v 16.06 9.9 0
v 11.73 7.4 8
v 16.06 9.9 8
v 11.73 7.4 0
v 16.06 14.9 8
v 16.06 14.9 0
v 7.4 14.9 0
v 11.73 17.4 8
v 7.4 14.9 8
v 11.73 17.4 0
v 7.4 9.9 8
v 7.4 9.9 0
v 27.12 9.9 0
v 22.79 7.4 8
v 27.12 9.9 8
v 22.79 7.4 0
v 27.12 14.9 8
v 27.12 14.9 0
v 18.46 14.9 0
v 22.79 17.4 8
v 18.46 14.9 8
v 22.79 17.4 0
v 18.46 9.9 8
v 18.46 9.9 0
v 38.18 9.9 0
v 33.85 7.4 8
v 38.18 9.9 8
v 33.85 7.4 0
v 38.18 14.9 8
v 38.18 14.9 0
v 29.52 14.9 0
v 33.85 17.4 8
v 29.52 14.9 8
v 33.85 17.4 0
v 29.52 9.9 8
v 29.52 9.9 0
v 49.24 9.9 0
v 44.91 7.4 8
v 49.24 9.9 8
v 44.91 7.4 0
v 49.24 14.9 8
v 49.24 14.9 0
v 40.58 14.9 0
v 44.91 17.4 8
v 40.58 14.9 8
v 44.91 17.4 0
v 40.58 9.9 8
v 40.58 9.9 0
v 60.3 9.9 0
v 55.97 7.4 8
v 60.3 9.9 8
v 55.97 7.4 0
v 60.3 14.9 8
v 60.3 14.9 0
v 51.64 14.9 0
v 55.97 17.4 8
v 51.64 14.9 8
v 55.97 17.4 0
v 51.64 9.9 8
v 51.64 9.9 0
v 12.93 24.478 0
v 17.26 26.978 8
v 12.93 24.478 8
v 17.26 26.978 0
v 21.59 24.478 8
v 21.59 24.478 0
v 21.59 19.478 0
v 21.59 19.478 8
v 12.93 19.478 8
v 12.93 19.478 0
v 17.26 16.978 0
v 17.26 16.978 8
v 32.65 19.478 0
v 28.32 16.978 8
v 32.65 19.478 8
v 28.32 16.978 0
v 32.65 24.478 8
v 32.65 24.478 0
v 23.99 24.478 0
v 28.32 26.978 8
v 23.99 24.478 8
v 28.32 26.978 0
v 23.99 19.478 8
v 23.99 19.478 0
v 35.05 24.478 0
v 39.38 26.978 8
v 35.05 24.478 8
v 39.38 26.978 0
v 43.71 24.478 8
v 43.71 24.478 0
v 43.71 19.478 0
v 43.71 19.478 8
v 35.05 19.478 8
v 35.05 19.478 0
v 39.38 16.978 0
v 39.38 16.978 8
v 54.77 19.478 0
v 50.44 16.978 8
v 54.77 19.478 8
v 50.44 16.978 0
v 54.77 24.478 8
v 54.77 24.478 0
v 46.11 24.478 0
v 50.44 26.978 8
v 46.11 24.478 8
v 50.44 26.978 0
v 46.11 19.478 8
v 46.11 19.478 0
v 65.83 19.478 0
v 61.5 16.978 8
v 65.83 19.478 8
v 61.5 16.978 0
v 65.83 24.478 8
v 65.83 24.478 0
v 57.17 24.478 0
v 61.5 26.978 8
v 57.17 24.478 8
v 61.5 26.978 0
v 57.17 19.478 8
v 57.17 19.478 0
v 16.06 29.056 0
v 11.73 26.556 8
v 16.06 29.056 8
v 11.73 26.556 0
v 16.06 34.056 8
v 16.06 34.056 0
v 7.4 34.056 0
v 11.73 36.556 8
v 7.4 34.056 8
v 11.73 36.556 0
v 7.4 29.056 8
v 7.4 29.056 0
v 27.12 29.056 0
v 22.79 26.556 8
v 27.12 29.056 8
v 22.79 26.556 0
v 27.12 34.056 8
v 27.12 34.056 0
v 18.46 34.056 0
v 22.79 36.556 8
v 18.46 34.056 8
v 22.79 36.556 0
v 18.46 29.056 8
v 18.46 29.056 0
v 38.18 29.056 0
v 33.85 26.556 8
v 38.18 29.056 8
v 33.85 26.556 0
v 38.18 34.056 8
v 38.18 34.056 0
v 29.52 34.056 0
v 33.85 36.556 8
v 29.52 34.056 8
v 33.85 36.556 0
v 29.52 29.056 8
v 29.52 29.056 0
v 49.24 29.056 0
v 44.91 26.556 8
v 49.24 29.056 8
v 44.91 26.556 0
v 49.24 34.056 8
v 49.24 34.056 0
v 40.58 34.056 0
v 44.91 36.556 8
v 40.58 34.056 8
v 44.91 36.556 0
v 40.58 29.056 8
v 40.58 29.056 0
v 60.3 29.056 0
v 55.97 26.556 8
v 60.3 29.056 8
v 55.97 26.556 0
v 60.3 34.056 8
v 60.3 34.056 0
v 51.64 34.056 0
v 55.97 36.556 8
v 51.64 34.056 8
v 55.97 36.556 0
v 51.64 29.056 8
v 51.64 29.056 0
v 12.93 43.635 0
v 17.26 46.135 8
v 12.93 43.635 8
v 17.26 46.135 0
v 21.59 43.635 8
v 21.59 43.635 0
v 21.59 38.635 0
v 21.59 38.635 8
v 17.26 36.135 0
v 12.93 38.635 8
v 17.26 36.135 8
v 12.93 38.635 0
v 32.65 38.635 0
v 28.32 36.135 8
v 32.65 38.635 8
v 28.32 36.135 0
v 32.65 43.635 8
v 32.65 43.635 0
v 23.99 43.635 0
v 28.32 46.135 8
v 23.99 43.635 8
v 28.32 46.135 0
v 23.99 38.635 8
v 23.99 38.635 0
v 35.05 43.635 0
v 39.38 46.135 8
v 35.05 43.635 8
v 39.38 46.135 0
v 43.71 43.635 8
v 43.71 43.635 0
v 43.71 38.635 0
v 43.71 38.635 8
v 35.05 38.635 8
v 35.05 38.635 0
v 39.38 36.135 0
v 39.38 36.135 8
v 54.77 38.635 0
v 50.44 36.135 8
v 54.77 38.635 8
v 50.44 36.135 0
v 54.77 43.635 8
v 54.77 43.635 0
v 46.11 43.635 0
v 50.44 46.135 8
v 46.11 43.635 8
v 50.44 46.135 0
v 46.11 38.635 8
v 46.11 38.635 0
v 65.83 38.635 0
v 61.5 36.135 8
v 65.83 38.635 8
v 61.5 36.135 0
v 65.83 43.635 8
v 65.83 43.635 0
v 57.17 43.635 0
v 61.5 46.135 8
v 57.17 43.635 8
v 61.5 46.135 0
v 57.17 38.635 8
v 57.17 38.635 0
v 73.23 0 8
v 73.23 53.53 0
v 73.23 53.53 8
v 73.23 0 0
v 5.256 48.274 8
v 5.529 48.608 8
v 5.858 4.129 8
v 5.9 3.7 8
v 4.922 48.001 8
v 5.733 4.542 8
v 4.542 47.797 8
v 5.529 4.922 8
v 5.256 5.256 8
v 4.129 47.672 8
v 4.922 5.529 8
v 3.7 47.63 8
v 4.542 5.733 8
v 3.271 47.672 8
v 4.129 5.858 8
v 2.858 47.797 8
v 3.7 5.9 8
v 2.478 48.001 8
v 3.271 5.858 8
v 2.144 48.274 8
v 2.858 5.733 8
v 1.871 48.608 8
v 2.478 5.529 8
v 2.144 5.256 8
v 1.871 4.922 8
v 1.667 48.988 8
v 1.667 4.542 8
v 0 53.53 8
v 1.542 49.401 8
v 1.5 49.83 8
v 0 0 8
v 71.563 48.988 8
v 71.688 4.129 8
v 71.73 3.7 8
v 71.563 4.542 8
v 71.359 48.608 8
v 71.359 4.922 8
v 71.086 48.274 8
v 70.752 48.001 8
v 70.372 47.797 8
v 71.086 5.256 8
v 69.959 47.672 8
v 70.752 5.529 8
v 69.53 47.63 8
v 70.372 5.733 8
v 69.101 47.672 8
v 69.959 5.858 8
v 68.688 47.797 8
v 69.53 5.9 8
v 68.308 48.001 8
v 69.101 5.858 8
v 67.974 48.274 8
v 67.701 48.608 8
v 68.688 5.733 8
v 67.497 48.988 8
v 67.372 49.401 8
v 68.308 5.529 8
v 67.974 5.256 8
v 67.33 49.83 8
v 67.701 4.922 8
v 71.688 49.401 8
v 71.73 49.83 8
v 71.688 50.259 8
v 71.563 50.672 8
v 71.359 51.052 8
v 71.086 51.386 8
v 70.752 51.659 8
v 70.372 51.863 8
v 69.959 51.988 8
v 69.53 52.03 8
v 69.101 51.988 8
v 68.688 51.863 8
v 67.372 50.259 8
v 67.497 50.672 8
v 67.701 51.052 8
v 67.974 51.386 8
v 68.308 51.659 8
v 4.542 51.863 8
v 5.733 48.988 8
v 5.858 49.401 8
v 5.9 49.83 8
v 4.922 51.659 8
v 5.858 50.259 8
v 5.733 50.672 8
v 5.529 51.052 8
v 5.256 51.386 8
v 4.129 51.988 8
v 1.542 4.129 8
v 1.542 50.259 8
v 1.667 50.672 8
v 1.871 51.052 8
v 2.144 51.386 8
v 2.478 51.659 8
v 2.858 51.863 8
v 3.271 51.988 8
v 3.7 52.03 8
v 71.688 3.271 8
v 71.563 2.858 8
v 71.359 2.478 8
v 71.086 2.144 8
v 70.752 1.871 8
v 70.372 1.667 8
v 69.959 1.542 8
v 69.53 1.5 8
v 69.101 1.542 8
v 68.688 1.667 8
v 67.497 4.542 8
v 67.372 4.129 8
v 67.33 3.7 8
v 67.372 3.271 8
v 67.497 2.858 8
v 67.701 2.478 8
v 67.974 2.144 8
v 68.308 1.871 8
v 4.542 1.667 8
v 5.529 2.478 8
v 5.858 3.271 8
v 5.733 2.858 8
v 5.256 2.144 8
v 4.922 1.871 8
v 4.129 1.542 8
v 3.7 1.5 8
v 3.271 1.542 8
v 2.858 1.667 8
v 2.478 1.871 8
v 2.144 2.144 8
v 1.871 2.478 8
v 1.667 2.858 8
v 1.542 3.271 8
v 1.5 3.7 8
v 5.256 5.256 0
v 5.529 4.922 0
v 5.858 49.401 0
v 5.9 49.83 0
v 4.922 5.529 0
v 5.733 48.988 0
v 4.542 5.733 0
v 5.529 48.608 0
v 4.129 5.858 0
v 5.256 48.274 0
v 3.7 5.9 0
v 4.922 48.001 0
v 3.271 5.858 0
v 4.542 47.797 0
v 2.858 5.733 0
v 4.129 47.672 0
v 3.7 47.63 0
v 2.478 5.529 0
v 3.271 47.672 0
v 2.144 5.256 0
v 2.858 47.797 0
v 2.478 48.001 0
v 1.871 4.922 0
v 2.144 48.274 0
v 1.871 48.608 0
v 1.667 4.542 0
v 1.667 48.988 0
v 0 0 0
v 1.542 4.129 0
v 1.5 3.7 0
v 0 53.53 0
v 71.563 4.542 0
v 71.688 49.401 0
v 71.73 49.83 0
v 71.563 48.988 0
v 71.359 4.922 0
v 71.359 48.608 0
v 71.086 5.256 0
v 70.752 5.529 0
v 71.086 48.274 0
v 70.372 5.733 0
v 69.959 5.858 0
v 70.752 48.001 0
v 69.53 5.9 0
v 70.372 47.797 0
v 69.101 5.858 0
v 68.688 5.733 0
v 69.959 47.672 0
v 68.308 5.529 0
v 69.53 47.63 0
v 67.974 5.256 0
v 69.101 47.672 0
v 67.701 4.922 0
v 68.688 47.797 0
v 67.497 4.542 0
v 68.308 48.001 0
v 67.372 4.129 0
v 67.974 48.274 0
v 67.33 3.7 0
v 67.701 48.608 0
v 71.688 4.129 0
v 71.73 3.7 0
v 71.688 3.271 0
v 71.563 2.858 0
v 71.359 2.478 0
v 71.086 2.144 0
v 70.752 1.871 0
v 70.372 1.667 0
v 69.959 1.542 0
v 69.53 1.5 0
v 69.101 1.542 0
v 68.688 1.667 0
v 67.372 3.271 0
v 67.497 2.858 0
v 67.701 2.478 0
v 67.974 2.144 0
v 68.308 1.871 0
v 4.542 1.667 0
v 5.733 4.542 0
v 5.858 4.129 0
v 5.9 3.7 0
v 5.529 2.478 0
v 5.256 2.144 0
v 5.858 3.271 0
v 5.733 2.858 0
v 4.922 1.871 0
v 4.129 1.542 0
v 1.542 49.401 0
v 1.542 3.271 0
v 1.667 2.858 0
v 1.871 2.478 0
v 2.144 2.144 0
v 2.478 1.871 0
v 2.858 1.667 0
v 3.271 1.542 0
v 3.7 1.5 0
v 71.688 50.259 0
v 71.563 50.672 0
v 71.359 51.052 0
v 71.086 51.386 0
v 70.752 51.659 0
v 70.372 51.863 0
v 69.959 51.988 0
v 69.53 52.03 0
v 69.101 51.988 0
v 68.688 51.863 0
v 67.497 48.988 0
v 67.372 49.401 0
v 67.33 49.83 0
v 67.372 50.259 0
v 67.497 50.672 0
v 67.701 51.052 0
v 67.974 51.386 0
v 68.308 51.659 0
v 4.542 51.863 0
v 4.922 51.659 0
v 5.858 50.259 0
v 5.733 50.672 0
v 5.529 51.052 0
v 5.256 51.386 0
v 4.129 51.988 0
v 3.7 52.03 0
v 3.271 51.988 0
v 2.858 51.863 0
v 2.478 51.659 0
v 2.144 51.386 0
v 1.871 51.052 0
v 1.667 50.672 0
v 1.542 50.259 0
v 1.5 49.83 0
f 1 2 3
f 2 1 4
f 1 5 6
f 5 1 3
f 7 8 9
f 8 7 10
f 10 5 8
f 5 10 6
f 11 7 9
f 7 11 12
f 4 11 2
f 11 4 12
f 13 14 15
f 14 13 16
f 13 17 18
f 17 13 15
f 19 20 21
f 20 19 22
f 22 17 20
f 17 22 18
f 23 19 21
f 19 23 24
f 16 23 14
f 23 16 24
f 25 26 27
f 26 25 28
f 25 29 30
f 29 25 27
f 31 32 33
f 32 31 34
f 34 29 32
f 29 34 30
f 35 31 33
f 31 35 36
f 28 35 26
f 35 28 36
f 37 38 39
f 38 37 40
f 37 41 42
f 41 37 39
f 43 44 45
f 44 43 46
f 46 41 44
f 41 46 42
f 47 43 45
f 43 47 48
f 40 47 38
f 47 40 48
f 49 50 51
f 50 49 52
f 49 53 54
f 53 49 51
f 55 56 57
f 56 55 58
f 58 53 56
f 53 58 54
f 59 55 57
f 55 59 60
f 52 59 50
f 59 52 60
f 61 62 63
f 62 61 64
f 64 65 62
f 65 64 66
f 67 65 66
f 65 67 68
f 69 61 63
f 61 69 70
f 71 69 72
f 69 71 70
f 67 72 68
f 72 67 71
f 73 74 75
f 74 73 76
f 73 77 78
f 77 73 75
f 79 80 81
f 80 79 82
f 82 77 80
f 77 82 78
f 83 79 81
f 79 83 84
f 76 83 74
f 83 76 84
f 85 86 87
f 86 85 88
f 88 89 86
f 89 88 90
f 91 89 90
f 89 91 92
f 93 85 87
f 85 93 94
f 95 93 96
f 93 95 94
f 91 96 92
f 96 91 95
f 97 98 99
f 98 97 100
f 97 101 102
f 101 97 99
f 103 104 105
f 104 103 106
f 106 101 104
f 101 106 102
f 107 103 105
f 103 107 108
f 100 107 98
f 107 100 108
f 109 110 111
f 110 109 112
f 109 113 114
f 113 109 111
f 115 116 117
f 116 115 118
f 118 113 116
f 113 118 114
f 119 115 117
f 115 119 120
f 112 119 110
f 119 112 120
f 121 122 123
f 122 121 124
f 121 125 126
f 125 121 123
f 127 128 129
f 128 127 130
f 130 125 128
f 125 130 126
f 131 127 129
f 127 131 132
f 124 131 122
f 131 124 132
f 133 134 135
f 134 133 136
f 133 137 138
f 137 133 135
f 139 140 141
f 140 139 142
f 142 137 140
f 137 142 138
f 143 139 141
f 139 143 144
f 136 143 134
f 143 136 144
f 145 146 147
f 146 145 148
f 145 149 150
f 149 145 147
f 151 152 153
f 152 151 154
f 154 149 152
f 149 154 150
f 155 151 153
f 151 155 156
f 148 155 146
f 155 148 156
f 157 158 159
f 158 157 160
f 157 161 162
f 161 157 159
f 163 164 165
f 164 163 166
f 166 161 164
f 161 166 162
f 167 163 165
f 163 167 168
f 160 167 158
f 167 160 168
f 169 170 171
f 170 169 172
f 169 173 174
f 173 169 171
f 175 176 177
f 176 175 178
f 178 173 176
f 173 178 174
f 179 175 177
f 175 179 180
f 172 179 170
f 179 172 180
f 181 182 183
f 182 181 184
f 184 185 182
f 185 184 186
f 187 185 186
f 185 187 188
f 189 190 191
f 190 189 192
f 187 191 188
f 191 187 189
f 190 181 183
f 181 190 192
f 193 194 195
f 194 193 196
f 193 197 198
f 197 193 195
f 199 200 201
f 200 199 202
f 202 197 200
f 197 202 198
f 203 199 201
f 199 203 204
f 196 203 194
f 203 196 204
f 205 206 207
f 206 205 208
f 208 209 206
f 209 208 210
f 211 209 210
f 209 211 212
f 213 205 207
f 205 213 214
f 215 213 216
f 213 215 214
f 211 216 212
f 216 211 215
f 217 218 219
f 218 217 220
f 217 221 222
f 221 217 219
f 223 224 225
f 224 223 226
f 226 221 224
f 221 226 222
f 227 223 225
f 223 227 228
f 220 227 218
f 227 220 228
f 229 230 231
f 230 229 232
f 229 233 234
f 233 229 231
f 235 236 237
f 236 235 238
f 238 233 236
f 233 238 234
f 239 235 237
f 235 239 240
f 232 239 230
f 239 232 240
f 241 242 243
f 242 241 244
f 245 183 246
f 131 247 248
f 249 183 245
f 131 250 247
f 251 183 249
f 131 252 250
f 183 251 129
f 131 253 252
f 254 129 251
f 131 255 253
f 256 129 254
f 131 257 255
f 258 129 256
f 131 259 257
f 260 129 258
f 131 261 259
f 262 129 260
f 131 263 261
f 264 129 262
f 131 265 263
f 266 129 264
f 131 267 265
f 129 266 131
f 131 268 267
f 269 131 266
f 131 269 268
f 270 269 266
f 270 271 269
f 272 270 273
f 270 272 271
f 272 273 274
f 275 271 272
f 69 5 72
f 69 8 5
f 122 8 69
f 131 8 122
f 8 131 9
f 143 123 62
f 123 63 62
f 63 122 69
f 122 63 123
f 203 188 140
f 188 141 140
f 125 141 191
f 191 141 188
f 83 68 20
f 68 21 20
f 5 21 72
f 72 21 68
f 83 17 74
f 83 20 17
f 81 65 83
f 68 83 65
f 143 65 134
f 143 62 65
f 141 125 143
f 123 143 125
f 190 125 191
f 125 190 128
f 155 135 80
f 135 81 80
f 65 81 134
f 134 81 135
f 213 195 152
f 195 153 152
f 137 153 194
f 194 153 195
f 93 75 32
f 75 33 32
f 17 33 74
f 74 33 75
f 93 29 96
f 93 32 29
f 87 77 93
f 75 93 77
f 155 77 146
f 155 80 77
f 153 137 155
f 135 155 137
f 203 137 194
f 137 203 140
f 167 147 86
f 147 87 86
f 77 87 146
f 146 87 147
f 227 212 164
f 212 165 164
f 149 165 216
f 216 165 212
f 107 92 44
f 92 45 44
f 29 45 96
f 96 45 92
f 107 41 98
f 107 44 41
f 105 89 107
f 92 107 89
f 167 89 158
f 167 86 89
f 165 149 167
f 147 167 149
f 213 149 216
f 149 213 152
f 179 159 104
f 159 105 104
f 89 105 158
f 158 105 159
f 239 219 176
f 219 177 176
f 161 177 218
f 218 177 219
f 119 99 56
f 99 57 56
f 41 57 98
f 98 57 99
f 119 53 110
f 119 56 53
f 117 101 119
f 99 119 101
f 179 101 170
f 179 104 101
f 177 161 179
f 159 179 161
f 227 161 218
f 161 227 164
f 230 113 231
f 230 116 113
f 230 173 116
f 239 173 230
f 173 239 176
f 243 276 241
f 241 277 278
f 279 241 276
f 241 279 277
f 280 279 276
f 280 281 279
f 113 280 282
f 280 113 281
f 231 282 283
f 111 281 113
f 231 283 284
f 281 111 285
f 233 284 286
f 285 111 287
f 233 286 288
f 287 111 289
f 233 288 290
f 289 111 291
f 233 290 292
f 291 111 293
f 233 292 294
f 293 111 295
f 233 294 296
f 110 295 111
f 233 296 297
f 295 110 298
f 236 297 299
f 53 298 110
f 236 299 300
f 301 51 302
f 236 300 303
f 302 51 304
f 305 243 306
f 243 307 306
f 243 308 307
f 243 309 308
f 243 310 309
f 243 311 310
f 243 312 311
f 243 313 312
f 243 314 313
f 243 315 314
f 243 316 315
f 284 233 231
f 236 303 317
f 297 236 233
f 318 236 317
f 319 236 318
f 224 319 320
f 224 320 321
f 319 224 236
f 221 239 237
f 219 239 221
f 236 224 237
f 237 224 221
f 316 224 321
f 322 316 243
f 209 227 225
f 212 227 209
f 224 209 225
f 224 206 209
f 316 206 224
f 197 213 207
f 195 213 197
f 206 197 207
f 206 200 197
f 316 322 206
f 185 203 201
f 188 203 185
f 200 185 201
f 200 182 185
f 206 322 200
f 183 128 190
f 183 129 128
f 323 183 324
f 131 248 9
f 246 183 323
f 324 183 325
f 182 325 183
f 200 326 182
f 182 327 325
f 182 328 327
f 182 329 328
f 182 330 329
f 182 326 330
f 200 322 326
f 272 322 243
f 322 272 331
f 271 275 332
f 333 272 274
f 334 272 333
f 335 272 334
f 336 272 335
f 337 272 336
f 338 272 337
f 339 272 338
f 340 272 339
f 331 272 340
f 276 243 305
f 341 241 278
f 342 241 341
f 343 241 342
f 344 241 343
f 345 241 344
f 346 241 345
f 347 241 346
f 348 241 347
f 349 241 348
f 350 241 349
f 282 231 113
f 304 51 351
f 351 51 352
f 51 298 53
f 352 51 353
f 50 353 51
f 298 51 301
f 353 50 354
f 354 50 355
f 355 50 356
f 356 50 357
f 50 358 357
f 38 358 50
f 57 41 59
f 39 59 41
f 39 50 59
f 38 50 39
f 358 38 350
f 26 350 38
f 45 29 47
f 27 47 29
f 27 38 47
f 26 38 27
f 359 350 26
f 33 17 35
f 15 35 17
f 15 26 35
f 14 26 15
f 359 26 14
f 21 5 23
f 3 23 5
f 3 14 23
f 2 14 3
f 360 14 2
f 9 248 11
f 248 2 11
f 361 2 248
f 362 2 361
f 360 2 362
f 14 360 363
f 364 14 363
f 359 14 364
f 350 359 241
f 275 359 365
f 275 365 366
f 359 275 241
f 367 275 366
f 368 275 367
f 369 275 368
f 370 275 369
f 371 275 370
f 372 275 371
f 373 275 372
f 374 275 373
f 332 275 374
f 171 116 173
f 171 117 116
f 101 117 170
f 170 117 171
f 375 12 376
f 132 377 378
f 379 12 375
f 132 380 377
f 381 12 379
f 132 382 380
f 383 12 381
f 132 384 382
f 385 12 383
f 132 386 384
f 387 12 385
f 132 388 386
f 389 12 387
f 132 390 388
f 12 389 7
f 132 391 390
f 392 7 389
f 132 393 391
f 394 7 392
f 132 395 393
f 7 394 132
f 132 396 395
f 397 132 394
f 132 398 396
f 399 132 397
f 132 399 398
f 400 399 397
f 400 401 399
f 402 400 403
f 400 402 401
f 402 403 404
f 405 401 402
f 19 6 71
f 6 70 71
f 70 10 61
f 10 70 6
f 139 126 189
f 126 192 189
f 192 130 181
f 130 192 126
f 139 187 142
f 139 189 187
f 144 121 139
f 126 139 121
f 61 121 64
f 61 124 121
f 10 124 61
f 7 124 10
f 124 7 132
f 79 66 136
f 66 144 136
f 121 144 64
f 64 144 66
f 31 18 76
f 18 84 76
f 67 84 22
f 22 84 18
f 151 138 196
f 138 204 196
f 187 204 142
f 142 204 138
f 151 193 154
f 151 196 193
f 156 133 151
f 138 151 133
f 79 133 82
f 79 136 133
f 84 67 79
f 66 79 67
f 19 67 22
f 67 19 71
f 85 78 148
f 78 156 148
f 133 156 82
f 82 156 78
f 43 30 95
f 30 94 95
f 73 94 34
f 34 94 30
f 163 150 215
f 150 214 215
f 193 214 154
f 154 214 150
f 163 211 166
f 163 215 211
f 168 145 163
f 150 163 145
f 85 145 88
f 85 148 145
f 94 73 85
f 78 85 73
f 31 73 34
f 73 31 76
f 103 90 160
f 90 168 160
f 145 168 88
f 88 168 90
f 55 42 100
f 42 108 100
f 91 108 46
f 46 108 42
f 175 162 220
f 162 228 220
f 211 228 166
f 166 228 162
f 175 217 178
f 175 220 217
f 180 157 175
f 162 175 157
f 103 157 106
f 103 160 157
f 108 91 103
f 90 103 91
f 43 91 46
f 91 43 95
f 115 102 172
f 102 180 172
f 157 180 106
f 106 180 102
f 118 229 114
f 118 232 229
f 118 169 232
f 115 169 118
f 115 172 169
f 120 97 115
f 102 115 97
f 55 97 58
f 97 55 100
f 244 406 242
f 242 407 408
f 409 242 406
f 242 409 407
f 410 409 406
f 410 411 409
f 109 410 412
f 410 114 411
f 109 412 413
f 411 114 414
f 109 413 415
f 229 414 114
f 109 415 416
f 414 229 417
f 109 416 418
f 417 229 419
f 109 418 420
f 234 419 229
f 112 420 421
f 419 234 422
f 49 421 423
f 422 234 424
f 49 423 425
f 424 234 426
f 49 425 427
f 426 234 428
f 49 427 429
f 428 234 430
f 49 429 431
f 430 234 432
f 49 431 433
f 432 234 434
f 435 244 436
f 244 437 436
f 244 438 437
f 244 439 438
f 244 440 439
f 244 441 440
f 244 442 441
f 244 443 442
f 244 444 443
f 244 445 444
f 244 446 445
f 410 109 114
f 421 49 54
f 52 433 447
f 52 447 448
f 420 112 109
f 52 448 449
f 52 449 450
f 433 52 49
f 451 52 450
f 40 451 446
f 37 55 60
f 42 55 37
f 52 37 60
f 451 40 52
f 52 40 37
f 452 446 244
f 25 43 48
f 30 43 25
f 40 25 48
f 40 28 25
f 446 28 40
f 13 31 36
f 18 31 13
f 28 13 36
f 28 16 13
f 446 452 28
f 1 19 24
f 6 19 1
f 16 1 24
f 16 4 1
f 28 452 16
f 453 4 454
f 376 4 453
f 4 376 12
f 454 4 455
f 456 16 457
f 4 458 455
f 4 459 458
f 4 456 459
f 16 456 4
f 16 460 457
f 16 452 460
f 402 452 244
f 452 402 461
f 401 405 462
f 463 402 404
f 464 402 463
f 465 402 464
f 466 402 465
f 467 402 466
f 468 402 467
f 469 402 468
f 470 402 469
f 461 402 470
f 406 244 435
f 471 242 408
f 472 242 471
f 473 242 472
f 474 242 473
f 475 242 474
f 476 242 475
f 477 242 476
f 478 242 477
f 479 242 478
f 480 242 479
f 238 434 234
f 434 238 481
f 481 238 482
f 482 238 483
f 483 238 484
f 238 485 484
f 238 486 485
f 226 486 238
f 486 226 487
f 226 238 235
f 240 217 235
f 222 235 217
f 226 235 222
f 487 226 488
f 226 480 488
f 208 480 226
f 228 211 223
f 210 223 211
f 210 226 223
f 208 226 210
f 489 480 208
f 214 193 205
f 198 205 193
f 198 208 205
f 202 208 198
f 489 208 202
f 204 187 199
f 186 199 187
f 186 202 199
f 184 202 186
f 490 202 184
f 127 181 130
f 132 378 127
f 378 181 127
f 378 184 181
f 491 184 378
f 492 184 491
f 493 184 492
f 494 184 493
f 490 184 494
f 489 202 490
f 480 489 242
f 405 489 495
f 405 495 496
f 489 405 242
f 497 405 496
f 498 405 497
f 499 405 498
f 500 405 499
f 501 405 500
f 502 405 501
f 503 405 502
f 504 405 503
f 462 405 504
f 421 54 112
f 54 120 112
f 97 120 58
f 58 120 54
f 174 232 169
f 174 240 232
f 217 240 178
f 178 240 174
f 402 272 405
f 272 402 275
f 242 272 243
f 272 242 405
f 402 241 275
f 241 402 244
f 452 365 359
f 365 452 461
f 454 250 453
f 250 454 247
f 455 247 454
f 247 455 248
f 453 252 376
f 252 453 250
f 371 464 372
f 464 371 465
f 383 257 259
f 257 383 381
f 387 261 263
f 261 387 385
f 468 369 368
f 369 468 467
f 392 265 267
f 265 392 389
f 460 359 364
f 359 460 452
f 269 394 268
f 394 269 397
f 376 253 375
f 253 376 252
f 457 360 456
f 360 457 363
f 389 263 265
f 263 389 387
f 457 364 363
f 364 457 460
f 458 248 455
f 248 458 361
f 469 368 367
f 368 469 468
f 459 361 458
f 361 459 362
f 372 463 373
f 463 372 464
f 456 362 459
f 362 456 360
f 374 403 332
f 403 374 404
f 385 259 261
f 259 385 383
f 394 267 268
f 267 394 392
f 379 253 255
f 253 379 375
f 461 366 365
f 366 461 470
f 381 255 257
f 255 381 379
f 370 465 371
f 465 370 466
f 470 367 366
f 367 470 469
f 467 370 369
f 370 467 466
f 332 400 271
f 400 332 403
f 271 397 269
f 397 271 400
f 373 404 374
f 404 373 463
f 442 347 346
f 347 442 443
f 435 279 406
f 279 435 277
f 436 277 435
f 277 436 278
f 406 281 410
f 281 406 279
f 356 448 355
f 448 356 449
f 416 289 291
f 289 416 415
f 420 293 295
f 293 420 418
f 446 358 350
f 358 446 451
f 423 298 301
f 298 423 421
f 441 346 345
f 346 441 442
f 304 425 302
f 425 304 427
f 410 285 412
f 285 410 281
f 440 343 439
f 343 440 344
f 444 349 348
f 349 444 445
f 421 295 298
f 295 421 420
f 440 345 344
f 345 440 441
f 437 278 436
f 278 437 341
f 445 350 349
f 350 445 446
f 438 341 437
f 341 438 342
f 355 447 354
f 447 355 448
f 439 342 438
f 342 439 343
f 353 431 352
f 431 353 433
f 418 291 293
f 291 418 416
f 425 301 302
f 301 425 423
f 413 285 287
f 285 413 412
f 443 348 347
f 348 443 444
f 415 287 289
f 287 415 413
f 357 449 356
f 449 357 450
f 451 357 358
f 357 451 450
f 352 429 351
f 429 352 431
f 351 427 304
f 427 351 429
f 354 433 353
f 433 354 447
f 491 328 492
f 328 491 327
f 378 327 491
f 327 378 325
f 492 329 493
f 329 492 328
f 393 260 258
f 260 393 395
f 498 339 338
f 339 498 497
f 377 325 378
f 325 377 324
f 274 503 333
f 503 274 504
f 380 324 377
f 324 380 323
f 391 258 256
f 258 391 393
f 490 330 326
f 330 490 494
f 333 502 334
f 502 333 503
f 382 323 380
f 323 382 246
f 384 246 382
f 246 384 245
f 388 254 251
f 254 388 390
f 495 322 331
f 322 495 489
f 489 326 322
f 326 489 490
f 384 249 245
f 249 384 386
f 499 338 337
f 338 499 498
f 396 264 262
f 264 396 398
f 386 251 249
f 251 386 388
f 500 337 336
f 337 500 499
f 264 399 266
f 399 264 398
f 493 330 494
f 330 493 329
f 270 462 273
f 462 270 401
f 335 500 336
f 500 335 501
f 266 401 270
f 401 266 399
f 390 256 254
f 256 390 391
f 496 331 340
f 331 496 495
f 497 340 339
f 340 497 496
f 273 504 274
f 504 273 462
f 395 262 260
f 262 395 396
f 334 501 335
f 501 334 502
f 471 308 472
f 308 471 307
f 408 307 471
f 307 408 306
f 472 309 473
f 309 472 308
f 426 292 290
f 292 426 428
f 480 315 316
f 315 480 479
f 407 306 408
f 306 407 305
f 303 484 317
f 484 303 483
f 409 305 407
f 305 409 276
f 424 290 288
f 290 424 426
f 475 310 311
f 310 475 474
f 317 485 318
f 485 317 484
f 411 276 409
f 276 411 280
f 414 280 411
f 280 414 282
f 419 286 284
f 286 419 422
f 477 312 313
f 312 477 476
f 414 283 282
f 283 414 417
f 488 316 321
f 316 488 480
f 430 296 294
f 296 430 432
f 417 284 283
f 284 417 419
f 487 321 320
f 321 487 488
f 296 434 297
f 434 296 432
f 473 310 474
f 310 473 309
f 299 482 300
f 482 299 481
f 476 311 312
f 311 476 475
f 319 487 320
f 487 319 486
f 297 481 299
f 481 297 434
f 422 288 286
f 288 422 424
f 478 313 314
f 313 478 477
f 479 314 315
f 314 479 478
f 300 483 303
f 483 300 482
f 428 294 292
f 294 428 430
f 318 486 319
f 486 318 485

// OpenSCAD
$fn = 32;

// ----------------------------------------------------------------------
// Honeycomb panel: 73.23 x 53.53 mm, 20 cells of 10 mm
// ----------------------------------------------------------------------

// --- parameters (mm) ---
panel_w = 73.23;          // panel width
panel_d = 53.53;          // panel depth
thick = 8;                // panel thickness
cell_r = 5;               // hex cell circumradius
pitch = 11.06;            // hex cell pitch (centre to centre)
web = 2.4;                // web between the cells
columns = 5;              // columns of cells
rows = 4;                 // rows of cells
cell_count = 20;          // total cells
shift_x = 11.73;          // first cell offset in x
shift_y = 12.4;           // first cell offset in y
mount_d = 4.4;            // corner mounting holes
hole_off = 3.7;           // mounting hole offset from the corners

difference() {
  union() {
    cube([panel_w, panel_d, thick]);
  }
  /* hexagonal cells, point-up, cut right through the plate */
  for (row = [0 : rows - 1]) {
    for (col = [0 : columns - 1]) {
      translate([shift_x + col * pitch + (row % 2) * pitch / 2, shift_y + row * pitch * 0.866025, -2.5]) rotate([0, 0, 30]) cylinder(h = thick + 5, d = 2 * cell_r, $fn = 6);
    }
  }
  /* corner mounting holes, clear of the outer cell web */
  translate([3.7, 3.7, -2.5]) cylinder(h = thick + 5, d = mount_d);
  translate([69.53, 3.7, -2.5]) cylinder(h = thick + 5, d = mount_d);
  translate([3.7, 49.83, -2.5]) cylinder(h = thick + 5, d = mount_d);
  translate([69.53, 49.83, -2.5]) cylinder(h = thick + 5, d = mount_d);
}
